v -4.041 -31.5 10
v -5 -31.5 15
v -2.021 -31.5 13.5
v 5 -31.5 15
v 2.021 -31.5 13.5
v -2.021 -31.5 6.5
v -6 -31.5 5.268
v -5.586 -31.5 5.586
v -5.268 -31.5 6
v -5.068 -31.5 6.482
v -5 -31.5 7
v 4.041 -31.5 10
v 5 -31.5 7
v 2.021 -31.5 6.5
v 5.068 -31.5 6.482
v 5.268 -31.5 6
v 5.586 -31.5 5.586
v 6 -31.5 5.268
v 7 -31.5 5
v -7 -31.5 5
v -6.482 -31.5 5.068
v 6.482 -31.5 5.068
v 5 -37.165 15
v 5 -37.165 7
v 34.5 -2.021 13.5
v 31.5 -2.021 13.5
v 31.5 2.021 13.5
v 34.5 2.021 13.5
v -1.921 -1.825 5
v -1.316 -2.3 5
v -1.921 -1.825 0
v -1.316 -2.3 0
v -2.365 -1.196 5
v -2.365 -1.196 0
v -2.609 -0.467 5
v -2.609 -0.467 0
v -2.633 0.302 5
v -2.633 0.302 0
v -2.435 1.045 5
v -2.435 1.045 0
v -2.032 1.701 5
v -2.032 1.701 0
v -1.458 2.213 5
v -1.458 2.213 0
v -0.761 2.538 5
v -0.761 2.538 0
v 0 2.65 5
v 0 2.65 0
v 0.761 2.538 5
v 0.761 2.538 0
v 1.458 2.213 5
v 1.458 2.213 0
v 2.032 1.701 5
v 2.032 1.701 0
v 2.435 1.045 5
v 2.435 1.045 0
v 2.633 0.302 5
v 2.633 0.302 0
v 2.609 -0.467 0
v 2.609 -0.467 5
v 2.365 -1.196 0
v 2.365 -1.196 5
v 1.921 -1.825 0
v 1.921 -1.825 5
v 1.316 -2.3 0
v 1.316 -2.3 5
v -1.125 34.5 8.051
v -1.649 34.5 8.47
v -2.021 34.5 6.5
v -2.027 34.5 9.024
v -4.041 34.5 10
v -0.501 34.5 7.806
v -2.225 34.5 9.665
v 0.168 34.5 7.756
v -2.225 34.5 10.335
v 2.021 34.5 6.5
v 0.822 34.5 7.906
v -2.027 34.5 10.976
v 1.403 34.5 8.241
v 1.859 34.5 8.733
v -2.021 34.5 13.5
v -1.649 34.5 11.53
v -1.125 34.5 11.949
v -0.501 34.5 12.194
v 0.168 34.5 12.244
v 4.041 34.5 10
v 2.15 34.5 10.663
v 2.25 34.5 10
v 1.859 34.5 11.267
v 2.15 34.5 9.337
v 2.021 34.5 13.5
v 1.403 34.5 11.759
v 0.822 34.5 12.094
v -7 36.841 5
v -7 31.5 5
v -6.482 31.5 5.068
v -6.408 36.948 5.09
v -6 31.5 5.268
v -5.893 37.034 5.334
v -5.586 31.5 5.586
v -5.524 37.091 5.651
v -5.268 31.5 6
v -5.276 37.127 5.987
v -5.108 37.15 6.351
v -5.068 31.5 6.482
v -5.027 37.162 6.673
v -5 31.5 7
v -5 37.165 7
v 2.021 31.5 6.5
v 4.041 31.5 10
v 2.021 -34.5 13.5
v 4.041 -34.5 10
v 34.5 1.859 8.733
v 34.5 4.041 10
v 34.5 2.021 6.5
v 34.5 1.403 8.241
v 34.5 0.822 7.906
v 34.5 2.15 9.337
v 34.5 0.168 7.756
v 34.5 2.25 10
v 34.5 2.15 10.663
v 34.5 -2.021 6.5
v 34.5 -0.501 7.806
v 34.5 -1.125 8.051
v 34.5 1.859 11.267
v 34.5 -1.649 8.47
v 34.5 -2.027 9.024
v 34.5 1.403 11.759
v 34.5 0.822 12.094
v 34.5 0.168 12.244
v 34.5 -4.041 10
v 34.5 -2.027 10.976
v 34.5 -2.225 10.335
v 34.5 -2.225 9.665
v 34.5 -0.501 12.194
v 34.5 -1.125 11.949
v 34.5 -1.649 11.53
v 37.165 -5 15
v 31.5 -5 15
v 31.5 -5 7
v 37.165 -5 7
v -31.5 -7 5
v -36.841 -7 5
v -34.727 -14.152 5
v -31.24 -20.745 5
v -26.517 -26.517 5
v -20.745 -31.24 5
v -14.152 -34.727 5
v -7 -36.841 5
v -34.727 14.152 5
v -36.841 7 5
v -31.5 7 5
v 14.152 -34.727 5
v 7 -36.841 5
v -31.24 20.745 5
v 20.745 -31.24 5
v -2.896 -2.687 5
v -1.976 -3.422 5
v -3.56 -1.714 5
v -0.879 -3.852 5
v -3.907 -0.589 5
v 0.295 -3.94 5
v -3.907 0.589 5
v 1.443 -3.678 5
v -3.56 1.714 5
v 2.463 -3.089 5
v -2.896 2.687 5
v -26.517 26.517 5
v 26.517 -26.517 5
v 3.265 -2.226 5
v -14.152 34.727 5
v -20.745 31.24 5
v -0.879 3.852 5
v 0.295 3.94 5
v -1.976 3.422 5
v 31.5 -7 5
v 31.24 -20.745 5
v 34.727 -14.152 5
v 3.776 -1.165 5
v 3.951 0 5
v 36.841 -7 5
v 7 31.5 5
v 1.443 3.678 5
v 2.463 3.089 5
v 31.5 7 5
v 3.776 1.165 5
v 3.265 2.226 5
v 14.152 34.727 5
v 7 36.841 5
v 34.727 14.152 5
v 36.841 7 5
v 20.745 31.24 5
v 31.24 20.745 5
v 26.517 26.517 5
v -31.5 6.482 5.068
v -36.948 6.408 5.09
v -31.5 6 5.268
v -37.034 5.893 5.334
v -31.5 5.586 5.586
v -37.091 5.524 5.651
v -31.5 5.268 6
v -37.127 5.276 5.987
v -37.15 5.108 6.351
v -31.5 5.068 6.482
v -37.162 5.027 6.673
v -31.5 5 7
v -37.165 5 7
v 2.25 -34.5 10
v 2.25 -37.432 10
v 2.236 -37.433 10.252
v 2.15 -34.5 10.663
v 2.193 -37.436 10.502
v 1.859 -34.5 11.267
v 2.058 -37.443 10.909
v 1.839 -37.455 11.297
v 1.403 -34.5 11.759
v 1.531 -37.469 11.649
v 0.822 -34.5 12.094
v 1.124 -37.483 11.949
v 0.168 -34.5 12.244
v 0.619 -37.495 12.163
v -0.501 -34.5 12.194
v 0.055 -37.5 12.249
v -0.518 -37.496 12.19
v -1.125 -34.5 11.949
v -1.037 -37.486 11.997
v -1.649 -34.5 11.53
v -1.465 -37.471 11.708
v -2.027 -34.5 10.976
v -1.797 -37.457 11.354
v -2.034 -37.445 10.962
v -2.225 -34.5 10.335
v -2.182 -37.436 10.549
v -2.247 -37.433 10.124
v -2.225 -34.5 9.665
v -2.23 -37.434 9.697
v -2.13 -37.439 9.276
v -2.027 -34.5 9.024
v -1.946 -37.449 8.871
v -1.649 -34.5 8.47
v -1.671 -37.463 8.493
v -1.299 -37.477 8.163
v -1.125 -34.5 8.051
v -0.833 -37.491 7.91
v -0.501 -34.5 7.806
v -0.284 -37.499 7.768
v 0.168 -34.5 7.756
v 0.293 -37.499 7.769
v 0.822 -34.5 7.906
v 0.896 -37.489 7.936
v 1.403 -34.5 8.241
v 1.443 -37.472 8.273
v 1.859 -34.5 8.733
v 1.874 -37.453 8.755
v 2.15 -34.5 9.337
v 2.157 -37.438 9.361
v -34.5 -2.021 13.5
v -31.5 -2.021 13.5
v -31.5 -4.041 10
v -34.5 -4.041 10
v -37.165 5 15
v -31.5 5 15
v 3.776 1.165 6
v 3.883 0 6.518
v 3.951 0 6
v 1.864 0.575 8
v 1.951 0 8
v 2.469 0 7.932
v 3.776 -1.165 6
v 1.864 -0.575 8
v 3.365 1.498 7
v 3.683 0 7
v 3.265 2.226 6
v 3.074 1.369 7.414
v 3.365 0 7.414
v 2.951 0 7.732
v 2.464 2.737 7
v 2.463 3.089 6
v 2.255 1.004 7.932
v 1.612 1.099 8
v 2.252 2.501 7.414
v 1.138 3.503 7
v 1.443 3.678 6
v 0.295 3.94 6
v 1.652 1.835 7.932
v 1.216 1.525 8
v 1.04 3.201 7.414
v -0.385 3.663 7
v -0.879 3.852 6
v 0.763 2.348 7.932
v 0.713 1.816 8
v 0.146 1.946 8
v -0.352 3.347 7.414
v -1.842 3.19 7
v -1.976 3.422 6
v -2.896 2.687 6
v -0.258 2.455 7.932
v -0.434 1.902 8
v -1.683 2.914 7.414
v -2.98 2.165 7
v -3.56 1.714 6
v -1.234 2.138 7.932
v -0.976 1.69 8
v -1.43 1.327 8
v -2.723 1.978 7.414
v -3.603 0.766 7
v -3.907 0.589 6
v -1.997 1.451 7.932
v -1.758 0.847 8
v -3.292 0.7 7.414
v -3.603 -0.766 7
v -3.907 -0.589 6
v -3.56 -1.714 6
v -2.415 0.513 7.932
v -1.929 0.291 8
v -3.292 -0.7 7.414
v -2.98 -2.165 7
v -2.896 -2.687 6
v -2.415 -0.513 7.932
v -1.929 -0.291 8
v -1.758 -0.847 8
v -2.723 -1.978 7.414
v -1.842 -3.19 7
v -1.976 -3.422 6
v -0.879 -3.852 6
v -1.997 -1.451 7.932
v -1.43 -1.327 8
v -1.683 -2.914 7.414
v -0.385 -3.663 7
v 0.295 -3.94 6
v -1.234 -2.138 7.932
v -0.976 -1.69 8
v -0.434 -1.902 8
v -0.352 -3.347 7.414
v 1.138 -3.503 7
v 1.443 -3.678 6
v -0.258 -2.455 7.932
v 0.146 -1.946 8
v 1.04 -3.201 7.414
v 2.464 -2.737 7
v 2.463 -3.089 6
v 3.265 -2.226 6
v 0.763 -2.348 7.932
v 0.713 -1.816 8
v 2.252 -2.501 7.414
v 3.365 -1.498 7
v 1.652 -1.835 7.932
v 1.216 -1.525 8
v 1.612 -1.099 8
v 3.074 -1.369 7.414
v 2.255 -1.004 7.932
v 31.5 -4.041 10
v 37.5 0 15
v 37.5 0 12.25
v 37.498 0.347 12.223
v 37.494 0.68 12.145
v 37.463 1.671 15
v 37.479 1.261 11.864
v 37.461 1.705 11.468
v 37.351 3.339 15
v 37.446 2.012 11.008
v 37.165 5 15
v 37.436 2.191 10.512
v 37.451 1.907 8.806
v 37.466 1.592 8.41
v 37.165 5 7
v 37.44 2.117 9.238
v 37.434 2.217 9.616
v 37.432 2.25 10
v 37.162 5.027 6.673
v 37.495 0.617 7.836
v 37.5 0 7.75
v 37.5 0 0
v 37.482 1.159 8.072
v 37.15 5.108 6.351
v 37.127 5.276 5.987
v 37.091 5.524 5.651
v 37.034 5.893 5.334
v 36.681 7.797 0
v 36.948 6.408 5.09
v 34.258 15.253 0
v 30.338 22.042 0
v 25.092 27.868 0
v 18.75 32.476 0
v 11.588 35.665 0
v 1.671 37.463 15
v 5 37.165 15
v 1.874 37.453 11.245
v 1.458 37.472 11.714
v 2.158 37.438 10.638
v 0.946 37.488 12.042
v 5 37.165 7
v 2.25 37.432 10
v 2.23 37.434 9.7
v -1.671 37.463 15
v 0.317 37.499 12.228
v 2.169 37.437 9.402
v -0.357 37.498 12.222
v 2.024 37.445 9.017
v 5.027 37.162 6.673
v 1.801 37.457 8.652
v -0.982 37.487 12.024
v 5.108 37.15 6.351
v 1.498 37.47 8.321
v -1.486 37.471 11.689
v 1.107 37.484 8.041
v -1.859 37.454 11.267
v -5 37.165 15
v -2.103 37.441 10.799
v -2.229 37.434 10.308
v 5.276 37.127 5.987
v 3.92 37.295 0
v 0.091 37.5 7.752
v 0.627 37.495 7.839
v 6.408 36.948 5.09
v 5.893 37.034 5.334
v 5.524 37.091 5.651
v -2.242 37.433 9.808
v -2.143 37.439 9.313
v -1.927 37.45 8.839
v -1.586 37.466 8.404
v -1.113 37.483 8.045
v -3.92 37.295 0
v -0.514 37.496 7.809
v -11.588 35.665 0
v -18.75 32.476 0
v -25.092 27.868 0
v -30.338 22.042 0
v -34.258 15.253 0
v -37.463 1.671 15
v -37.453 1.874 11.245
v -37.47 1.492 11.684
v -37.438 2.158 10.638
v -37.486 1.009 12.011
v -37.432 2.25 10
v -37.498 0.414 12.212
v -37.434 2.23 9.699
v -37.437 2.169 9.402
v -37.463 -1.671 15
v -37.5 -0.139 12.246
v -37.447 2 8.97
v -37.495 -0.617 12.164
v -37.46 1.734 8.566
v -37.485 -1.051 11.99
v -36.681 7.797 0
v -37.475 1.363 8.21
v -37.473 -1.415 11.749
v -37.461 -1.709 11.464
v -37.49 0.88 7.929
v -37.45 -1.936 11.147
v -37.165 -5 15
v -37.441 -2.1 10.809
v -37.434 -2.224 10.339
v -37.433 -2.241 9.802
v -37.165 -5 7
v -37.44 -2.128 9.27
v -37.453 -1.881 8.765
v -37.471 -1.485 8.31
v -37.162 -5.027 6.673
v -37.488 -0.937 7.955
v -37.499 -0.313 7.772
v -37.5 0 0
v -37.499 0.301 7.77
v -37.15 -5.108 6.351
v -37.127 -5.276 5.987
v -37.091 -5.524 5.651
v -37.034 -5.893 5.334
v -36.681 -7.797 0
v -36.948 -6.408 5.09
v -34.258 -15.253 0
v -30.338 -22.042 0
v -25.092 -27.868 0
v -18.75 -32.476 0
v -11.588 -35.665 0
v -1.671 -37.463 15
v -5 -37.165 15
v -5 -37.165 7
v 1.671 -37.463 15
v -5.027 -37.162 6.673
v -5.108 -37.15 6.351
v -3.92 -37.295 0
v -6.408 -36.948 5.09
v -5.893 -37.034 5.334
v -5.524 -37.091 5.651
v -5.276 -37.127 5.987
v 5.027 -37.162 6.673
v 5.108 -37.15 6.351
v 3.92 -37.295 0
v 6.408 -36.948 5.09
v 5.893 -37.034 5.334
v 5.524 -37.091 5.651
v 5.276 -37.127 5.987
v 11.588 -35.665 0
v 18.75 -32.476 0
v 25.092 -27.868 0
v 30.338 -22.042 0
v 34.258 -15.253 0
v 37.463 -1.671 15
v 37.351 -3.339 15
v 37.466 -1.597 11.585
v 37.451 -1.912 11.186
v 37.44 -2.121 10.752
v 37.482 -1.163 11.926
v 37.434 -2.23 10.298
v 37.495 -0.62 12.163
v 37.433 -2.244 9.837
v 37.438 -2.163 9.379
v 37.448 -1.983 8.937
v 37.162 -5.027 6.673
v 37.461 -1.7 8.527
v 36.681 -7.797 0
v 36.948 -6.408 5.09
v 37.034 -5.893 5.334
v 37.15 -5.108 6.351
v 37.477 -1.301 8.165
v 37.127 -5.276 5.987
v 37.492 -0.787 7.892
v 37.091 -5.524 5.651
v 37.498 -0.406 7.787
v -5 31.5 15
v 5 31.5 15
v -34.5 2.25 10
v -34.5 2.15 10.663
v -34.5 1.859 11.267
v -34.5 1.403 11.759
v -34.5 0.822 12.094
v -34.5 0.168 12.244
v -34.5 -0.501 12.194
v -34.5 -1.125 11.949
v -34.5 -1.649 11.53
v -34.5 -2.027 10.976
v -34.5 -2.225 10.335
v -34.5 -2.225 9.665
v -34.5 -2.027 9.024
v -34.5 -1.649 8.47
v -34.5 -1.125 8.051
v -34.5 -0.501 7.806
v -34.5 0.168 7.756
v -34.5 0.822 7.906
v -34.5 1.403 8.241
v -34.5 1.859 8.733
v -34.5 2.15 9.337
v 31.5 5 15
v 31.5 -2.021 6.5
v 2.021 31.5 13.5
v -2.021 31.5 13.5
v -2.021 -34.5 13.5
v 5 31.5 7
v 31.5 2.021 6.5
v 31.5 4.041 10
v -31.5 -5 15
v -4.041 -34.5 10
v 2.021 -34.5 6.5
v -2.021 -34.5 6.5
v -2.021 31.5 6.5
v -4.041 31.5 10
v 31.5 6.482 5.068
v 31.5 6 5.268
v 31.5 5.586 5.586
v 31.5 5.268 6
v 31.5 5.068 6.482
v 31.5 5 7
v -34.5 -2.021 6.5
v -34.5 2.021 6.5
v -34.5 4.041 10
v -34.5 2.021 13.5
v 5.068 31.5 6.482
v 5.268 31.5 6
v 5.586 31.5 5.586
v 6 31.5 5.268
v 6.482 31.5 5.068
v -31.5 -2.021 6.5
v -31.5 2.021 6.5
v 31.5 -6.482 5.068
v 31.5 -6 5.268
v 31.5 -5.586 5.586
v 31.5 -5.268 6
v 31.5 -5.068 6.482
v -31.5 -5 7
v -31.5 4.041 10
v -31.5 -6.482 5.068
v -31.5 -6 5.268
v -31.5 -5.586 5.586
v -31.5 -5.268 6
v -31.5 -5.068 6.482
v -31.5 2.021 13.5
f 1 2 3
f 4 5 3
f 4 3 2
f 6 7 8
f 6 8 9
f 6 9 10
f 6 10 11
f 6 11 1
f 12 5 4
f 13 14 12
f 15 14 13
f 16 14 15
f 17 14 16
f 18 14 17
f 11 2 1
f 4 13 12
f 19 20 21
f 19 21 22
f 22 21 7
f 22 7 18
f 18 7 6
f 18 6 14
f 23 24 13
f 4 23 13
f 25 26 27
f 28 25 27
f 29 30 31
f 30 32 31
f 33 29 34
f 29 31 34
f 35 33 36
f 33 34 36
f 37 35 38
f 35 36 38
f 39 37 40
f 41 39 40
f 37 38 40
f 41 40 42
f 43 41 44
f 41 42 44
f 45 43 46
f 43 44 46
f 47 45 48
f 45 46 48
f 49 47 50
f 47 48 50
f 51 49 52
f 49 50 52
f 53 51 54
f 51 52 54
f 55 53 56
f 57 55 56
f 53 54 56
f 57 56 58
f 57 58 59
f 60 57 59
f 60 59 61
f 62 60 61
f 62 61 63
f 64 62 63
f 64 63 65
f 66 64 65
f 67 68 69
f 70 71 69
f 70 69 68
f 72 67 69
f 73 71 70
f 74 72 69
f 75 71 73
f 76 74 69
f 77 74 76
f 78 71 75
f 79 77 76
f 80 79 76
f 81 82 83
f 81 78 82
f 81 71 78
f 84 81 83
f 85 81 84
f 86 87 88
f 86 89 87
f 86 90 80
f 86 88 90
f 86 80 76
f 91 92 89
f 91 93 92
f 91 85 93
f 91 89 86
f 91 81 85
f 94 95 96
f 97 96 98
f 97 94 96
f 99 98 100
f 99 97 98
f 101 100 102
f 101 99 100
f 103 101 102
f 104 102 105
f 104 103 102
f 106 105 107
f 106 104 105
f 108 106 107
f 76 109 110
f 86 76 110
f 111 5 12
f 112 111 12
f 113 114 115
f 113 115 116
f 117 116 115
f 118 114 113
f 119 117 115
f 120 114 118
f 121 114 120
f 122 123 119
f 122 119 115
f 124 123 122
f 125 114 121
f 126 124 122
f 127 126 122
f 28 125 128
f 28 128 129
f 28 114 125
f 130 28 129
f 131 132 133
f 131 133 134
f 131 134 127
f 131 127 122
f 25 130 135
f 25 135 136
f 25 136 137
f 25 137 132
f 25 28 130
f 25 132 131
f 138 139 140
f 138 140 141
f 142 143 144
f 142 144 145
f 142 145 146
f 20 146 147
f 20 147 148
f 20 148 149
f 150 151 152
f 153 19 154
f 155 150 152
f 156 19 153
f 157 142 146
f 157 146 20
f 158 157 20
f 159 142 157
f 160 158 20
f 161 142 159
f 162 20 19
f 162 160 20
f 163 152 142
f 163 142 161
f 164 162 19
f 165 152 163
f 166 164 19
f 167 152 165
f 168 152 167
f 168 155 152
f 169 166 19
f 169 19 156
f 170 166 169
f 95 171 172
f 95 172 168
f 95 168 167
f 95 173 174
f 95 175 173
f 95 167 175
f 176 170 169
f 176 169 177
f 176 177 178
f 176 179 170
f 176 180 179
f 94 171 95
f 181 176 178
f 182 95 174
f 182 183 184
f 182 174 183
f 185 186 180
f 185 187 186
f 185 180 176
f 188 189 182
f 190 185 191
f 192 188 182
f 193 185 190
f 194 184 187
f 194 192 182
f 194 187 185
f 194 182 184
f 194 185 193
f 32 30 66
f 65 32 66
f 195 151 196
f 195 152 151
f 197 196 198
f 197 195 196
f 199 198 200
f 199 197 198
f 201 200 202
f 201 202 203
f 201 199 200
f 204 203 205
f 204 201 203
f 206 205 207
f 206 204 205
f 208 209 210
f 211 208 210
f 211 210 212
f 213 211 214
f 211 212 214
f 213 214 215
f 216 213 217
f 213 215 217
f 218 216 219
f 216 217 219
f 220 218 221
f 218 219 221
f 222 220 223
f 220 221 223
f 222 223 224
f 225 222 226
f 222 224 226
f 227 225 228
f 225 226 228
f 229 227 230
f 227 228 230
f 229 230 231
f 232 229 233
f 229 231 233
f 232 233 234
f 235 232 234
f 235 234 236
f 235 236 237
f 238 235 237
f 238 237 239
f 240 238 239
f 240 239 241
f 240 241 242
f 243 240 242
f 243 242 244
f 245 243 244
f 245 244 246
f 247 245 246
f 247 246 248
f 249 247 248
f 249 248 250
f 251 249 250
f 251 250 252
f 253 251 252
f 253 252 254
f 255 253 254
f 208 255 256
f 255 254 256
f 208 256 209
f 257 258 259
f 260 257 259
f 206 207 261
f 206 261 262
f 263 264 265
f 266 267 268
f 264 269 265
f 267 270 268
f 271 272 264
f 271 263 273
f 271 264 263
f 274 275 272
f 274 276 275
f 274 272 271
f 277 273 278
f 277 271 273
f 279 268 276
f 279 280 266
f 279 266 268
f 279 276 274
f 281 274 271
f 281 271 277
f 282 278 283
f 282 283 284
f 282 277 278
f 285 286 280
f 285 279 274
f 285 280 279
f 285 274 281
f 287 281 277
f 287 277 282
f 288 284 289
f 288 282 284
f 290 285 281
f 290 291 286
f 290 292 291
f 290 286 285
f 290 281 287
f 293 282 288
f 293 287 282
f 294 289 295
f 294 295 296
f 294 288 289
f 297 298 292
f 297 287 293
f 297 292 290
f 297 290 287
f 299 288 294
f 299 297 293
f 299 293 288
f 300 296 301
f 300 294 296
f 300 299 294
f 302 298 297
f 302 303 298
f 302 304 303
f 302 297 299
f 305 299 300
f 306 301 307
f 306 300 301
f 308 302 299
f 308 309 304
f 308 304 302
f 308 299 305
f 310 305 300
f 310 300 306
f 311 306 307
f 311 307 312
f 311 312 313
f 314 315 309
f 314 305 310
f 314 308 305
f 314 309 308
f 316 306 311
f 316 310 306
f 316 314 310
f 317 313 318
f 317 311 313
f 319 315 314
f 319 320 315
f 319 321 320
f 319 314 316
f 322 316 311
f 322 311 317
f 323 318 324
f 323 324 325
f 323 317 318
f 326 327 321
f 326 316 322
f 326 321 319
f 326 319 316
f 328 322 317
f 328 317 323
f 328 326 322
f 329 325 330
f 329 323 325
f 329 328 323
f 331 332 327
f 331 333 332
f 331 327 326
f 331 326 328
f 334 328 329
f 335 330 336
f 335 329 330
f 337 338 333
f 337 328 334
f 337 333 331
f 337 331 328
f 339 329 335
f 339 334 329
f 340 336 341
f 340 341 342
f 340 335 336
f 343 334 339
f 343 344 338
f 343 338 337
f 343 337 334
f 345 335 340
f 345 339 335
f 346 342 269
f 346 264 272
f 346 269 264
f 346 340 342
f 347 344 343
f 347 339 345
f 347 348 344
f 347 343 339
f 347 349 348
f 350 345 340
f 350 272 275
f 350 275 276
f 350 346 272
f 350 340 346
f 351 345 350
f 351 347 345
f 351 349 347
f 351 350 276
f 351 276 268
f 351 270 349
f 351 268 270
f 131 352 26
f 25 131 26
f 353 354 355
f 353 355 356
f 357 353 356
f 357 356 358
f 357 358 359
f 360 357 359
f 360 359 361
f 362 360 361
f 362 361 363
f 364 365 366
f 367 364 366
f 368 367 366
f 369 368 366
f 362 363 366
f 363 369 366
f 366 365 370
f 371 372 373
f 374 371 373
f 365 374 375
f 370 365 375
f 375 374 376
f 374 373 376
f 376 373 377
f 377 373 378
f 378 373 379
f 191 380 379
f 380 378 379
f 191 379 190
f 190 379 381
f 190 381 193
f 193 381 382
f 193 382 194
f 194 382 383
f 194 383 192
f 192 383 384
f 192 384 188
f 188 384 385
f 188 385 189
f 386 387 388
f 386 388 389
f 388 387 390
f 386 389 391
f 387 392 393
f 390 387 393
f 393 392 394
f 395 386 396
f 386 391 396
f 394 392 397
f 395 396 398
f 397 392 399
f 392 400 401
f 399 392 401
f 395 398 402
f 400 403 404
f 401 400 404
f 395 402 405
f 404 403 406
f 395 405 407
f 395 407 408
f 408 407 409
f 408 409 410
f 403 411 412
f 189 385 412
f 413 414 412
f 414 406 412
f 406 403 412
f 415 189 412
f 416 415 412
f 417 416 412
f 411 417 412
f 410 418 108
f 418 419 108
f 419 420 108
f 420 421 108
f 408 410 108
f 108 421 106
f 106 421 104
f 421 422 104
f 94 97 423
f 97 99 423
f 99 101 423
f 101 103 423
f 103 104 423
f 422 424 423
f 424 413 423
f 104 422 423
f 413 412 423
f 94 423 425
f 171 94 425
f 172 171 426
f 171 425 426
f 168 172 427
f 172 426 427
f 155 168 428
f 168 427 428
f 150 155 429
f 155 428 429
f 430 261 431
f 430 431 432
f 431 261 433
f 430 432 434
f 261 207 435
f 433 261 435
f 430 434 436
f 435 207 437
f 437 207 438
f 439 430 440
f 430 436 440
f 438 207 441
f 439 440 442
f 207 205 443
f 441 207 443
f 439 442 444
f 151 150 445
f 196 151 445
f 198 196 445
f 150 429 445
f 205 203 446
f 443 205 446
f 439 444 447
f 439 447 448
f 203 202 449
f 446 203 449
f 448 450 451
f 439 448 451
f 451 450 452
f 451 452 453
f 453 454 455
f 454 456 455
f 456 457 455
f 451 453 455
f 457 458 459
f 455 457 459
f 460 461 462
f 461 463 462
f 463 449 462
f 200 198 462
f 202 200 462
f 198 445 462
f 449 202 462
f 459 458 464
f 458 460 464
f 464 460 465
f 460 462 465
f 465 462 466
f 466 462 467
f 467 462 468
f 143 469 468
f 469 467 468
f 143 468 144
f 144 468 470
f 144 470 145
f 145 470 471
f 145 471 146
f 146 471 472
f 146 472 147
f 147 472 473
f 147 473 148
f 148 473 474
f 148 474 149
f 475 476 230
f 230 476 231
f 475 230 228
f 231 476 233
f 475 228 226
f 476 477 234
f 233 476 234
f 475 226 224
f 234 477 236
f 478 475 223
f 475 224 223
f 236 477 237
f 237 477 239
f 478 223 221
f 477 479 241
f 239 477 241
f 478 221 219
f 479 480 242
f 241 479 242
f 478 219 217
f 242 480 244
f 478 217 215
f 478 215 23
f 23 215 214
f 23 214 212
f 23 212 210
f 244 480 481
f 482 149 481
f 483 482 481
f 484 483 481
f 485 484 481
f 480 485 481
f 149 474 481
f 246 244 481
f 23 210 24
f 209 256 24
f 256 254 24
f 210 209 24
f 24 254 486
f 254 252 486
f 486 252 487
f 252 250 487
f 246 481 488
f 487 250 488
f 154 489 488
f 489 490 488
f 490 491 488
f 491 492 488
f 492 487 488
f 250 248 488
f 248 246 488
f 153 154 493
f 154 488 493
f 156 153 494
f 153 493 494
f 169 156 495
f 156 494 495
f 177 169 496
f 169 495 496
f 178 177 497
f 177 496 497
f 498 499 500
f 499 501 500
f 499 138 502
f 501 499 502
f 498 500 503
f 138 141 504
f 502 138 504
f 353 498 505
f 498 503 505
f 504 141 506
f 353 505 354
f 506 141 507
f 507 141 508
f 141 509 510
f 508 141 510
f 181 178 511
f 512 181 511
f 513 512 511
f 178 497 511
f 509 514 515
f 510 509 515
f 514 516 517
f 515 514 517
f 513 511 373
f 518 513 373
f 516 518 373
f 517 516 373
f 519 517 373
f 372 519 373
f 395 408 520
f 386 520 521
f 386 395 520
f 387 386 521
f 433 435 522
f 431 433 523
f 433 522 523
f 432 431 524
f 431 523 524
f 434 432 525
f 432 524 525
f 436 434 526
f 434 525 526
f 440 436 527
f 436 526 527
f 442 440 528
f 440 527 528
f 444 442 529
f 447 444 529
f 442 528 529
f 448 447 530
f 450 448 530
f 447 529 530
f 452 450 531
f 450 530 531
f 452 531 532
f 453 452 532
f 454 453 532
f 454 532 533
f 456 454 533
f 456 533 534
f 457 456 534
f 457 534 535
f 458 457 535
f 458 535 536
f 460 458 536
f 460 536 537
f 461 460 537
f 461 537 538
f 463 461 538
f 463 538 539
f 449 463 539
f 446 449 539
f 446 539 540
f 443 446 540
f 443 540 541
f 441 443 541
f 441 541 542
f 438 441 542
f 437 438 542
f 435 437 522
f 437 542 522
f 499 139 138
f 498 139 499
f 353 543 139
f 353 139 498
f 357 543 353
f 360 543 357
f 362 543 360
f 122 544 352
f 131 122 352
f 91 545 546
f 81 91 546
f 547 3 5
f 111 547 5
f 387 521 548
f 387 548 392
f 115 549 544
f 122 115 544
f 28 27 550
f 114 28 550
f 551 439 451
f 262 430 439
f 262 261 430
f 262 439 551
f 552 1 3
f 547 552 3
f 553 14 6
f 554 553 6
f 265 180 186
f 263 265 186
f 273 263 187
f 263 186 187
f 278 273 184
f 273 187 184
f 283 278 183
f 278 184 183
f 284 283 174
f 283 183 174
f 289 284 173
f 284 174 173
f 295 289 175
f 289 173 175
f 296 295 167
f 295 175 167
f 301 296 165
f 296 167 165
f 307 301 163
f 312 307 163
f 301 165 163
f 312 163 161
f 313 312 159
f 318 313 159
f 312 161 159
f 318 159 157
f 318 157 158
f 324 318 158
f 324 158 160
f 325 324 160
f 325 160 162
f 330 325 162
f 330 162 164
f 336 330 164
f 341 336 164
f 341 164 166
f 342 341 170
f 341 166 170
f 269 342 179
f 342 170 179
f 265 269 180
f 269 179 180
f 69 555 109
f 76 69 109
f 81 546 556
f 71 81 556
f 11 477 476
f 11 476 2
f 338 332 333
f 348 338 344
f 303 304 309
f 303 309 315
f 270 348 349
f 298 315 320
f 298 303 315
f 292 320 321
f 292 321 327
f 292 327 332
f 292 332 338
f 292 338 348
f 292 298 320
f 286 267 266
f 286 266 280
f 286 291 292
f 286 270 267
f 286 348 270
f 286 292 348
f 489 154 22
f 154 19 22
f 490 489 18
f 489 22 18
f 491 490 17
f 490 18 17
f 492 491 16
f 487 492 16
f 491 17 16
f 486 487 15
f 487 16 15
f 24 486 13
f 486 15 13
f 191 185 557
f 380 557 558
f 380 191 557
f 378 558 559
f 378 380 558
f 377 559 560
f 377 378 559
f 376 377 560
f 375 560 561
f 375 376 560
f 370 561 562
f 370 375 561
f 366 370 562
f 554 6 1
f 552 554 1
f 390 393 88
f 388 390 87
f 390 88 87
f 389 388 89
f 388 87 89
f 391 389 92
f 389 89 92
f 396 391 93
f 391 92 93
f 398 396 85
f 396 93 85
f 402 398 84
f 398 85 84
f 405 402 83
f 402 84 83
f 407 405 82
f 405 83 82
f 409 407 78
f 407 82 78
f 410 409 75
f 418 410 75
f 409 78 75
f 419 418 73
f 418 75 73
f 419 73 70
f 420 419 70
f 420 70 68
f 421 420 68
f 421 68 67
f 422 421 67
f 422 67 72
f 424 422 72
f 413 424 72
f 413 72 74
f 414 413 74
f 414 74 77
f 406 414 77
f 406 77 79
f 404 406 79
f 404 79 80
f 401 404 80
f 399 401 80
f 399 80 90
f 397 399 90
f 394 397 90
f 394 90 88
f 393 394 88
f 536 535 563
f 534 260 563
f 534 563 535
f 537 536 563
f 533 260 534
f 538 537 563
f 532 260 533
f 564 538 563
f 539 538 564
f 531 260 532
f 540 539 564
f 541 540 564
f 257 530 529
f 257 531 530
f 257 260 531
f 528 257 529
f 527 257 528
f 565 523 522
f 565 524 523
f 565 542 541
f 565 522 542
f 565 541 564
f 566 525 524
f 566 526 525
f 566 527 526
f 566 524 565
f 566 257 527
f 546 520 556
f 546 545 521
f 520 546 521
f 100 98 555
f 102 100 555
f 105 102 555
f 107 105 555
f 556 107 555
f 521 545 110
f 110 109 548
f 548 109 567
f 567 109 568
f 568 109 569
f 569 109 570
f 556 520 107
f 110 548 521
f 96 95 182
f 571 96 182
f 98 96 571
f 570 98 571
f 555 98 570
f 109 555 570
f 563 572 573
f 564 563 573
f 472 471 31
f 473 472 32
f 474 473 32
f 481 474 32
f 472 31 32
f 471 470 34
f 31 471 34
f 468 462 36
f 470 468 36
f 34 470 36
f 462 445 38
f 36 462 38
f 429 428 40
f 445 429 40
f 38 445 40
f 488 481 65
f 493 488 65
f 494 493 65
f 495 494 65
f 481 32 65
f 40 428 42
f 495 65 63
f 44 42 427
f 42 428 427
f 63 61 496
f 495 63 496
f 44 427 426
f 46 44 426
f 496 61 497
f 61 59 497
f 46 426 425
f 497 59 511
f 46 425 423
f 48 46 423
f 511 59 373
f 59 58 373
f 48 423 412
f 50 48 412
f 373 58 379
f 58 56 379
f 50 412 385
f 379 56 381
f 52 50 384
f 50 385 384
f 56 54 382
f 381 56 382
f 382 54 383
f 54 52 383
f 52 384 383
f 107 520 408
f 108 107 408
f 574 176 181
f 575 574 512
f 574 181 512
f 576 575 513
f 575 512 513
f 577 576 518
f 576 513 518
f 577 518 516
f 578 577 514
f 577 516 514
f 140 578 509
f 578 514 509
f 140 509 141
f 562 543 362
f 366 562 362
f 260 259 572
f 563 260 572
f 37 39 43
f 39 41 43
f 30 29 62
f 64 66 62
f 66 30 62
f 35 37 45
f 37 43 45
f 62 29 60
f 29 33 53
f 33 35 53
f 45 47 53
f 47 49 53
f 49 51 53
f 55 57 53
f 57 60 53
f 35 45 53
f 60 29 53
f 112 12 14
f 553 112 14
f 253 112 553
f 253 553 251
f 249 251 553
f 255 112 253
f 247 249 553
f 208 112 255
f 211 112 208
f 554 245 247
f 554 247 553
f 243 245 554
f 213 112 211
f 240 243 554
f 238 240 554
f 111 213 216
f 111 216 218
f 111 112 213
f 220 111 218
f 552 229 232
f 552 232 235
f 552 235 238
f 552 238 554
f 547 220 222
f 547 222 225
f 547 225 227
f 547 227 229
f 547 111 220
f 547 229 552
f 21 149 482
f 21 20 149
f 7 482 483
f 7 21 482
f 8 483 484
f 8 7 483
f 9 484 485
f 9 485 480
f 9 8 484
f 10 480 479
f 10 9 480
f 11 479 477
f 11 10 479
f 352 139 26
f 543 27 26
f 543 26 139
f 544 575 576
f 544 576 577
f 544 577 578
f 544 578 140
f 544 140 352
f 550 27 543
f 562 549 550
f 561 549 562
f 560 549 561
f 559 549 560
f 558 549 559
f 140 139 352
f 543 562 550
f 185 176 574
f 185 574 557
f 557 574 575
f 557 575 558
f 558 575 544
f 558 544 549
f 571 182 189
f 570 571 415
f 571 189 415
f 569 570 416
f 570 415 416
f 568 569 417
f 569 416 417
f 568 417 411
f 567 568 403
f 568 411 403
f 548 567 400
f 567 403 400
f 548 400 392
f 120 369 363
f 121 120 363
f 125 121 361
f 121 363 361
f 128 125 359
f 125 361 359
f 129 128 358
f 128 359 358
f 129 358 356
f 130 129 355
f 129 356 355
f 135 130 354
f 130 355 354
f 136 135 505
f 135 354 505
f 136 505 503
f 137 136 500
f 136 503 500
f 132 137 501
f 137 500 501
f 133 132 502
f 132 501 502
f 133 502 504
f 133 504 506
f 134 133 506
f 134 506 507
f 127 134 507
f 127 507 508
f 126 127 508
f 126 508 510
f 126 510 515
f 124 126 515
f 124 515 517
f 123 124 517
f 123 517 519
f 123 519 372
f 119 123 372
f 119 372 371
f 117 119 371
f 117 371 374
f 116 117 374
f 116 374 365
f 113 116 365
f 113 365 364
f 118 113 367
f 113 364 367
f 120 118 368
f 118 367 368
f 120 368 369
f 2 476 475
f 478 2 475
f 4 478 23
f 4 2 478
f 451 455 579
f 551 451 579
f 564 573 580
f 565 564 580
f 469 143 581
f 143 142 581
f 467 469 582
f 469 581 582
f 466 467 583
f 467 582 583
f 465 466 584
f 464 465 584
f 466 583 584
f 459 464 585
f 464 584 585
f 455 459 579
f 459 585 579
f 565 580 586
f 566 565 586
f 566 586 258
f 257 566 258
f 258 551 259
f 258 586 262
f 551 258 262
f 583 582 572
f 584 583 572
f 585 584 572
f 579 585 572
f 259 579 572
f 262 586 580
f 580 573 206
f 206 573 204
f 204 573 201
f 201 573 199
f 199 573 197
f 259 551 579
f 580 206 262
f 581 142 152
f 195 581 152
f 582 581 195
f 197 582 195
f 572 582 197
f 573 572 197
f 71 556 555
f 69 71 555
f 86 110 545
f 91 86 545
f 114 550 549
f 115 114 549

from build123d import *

# Parameters (mm, degrees)
SKETCH_R        = 37.5
PAD_DEPTH       = 5
SKETCH001_W     = 10
SKETCH001_H     = 6
SKETCH001_W_2   = 6
SKETCH001_H_2   = 10
PAD001_DEPTH    = 10
POCKET_DEPTH    = 3
POCKET001_DEPTH = 3
POCKET002_DEPTH = 3
POCKET003_DEPTH = 3
SKETCH006_R     = 2.25
POCKET004_DEPTH = 75
SKETCH007_R     = 2.25
POCKET005_DEPTH = 75
SKETCH008_R     = 2.65
POCKET006_DEPTH = 5
SKETCH009_W     = 3.74627
SKETCH009_H     = 0.45
PAD002_DEPTH    = 5
SKETCH010_R     = 40
SKETCH010_R_2   = 37.5
POCKET007_DEPTH = 15
FILLET_R        = 2
SKETCH011_R     = 3.951065
PAD003_DEPTH    = 3
FILLET001_R     = 2


with BuildPart() as part:
    # Sketch → Pad (new body)
    with BuildSketch(Plane.XY):
        Circle(SKETCH_R)
    extrude(amount=PAD_DEPTH)

    # Sketch001 (on Face3 of Pad) → Pad001 (join)
    with BuildSketch(Plane.XY.offset(5)):
        with Locations((0, 34.5)):
            Rectangle(SKETCH001_W, SKETCH001_H)
        with Locations((0, -34.5)):
            Rectangle(SKETCH001_W, SKETCH001_H)
        with Locations((-34.5, 0)):
            Rectangle(SKETCH001_W_2, SKETCH001_H_2)
        with Locations((34.5, 0)):
            Rectangle(SKETCH001_W_2, SKETCH001_H_2)
    extrude(amount=PAD001_DEPTH)

    # Sketch002 (on Face20 of Pad001) → Pocket (cut)
    with BuildSketch(Plane.YZ.offset(-31.5)):
        Polygon((4.041452, 10), (2.020726, 13.5), (-2.020726, 13.5), (-4.041452, 10), (-2.020726, 6.5), (2.020726, 6.5), align=None)
    extrude(amount=-POCKET_DEPTH, mode=Mode.SUBTRACT)

    # Sketch003 (on Face23 of Pocket) → Pocket001 (cut)
    with BuildSketch(Plane.XZ.offset(-31.5)):
        Polygon((4.041452, 10), (2.020726, 13.5), (-2.020726, 13.5), (-4.041452, 10), (-2.020726, 6.5), (2.020726, 6.5), align=None)
    extrude(amount=-POCKET001_DEPTH, mode=Mode.SUBTRACT)

    # Sketch004 (on Face15 of Pocket001) → Pocket002 (cut)
    with BuildSketch(Plane(origin=(31.5, 0, 0), x_dir=(0, -1, 0), z_dir=(-1, 0, 0))):
        Polygon((4.041452, 10), (2.020726, 13.5), (-2.020726, 13.5), (-4.041452, 10), (-2.020726, 6.5), (2.020726, 6.5), align=None)
    extrude(amount=-POCKET002_DEPTH, mode=Mode.SUBTRACT)

    # Sketch005 (on Face17 of Pocket002) → Pocket003 (cut)
    with BuildSketch(Plane(origin=(0, -31.5, 0), x_dir=(-1, 0, 0), z_dir=(0, 1, 0))):
        Polygon((4.041452, 10), (2.020726, 13.5), (-2.020726, 13.5), (-4.041452, 10), (-2.020726, 6.5), (2.020726, 6.5), align=None)
    extrude(amount=-POCKET003_DEPTH, mode=Mode.SUBTRACT)

    # Sketch006 (on Face12 of Pocket003) → Pocket004 (cut)
    with BuildSketch(Plane.YZ.offset(37.5)):
        with Locations((0, 10)):
            Circle(SKETCH006_R)
    extrude(amount=-POCKET004_DEPTH, mode=Mode.SUBTRACT)

    # Sketch007 (on Face25 of Pocket004) → Pocket005 (cut)
    with BuildSketch(Plane.XZ.offset(37.5)):
        with Locations((0, 10)):
            Circle(SKETCH007_R)
    extrude(amount=-POCKET005_DEPTH, mode=Mode.SUBTRACT)

    # Sketch008 (on Face2 of Pocket005) → Pocket006 (cut)
    with BuildSketch(Plane(origin=(0, 0, 0), x_dir=(1, 0, 0), z_dir=(0, 0, -1))):
        Circle(SKETCH008_R)
    extrude(amount=-POCKET006_DEPTH, mode=Mode.SUBTRACT)

    # Sketch009 (on Face2 of Pocket006) → Pad002 (join)
    with BuildSketch(Plane(origin=(0, 0, 0), x_dir=(1, 0, 0), z_dir=(0, 0, -1))):
        with Locations((-0.090507, 2.525)):
            Rectangle(SKETCH009_W, SKETCH009_H)
    extrude(amount=-PAD002_DEPTH)

    # Sketch010 (on Face62 of Pad002) → Pocket007 (cut)
    with BuildSketch(Plane(origin=(0, 0, 0), x_dir=(1, 0, 0), z_dir=(0, 0, -1))):
        Circle(SKETCH010_R)
        Circle(SKETCH010_R_2, mode=Mode.SUBTRACT)
    extrude(amount=-POCKET007_DEPTH, mode=Mode.SUBTRACT)

    # Fillet
    fillet_edges = [part.edges().sort_by_distance(p)[0] for p in [
        (5, -34.332586, 5),
        (-5, -34.332586, 5),
        (-34.332586, -5, 5),
        (34.332586, -5, 5),
        (5, 34.332586, 5),
        (34.332586, 5, 5),
        (-34.332586, 5, 5),
        (-5, 34.332586, 5),
    ]]
    fillet(fillet_edges, radius=FILLET_R)

    # Sketch011 (on Face1 of Fillet) → Pad003 (join)
    with BuildSketch(Plane.XY.offset(5)):
        Circle(SKETCH011_R)
    extrude(amount=PAD003_DEPTH)

    # Fillet001
    fillet001_edges = [part.edges().sort_by_distance(p)[0] for p in [
        (-3.951065, 0, 8),
    ]]
    fillet(fillet001_edges, radius=FILLET001_R)


solid = part.part
